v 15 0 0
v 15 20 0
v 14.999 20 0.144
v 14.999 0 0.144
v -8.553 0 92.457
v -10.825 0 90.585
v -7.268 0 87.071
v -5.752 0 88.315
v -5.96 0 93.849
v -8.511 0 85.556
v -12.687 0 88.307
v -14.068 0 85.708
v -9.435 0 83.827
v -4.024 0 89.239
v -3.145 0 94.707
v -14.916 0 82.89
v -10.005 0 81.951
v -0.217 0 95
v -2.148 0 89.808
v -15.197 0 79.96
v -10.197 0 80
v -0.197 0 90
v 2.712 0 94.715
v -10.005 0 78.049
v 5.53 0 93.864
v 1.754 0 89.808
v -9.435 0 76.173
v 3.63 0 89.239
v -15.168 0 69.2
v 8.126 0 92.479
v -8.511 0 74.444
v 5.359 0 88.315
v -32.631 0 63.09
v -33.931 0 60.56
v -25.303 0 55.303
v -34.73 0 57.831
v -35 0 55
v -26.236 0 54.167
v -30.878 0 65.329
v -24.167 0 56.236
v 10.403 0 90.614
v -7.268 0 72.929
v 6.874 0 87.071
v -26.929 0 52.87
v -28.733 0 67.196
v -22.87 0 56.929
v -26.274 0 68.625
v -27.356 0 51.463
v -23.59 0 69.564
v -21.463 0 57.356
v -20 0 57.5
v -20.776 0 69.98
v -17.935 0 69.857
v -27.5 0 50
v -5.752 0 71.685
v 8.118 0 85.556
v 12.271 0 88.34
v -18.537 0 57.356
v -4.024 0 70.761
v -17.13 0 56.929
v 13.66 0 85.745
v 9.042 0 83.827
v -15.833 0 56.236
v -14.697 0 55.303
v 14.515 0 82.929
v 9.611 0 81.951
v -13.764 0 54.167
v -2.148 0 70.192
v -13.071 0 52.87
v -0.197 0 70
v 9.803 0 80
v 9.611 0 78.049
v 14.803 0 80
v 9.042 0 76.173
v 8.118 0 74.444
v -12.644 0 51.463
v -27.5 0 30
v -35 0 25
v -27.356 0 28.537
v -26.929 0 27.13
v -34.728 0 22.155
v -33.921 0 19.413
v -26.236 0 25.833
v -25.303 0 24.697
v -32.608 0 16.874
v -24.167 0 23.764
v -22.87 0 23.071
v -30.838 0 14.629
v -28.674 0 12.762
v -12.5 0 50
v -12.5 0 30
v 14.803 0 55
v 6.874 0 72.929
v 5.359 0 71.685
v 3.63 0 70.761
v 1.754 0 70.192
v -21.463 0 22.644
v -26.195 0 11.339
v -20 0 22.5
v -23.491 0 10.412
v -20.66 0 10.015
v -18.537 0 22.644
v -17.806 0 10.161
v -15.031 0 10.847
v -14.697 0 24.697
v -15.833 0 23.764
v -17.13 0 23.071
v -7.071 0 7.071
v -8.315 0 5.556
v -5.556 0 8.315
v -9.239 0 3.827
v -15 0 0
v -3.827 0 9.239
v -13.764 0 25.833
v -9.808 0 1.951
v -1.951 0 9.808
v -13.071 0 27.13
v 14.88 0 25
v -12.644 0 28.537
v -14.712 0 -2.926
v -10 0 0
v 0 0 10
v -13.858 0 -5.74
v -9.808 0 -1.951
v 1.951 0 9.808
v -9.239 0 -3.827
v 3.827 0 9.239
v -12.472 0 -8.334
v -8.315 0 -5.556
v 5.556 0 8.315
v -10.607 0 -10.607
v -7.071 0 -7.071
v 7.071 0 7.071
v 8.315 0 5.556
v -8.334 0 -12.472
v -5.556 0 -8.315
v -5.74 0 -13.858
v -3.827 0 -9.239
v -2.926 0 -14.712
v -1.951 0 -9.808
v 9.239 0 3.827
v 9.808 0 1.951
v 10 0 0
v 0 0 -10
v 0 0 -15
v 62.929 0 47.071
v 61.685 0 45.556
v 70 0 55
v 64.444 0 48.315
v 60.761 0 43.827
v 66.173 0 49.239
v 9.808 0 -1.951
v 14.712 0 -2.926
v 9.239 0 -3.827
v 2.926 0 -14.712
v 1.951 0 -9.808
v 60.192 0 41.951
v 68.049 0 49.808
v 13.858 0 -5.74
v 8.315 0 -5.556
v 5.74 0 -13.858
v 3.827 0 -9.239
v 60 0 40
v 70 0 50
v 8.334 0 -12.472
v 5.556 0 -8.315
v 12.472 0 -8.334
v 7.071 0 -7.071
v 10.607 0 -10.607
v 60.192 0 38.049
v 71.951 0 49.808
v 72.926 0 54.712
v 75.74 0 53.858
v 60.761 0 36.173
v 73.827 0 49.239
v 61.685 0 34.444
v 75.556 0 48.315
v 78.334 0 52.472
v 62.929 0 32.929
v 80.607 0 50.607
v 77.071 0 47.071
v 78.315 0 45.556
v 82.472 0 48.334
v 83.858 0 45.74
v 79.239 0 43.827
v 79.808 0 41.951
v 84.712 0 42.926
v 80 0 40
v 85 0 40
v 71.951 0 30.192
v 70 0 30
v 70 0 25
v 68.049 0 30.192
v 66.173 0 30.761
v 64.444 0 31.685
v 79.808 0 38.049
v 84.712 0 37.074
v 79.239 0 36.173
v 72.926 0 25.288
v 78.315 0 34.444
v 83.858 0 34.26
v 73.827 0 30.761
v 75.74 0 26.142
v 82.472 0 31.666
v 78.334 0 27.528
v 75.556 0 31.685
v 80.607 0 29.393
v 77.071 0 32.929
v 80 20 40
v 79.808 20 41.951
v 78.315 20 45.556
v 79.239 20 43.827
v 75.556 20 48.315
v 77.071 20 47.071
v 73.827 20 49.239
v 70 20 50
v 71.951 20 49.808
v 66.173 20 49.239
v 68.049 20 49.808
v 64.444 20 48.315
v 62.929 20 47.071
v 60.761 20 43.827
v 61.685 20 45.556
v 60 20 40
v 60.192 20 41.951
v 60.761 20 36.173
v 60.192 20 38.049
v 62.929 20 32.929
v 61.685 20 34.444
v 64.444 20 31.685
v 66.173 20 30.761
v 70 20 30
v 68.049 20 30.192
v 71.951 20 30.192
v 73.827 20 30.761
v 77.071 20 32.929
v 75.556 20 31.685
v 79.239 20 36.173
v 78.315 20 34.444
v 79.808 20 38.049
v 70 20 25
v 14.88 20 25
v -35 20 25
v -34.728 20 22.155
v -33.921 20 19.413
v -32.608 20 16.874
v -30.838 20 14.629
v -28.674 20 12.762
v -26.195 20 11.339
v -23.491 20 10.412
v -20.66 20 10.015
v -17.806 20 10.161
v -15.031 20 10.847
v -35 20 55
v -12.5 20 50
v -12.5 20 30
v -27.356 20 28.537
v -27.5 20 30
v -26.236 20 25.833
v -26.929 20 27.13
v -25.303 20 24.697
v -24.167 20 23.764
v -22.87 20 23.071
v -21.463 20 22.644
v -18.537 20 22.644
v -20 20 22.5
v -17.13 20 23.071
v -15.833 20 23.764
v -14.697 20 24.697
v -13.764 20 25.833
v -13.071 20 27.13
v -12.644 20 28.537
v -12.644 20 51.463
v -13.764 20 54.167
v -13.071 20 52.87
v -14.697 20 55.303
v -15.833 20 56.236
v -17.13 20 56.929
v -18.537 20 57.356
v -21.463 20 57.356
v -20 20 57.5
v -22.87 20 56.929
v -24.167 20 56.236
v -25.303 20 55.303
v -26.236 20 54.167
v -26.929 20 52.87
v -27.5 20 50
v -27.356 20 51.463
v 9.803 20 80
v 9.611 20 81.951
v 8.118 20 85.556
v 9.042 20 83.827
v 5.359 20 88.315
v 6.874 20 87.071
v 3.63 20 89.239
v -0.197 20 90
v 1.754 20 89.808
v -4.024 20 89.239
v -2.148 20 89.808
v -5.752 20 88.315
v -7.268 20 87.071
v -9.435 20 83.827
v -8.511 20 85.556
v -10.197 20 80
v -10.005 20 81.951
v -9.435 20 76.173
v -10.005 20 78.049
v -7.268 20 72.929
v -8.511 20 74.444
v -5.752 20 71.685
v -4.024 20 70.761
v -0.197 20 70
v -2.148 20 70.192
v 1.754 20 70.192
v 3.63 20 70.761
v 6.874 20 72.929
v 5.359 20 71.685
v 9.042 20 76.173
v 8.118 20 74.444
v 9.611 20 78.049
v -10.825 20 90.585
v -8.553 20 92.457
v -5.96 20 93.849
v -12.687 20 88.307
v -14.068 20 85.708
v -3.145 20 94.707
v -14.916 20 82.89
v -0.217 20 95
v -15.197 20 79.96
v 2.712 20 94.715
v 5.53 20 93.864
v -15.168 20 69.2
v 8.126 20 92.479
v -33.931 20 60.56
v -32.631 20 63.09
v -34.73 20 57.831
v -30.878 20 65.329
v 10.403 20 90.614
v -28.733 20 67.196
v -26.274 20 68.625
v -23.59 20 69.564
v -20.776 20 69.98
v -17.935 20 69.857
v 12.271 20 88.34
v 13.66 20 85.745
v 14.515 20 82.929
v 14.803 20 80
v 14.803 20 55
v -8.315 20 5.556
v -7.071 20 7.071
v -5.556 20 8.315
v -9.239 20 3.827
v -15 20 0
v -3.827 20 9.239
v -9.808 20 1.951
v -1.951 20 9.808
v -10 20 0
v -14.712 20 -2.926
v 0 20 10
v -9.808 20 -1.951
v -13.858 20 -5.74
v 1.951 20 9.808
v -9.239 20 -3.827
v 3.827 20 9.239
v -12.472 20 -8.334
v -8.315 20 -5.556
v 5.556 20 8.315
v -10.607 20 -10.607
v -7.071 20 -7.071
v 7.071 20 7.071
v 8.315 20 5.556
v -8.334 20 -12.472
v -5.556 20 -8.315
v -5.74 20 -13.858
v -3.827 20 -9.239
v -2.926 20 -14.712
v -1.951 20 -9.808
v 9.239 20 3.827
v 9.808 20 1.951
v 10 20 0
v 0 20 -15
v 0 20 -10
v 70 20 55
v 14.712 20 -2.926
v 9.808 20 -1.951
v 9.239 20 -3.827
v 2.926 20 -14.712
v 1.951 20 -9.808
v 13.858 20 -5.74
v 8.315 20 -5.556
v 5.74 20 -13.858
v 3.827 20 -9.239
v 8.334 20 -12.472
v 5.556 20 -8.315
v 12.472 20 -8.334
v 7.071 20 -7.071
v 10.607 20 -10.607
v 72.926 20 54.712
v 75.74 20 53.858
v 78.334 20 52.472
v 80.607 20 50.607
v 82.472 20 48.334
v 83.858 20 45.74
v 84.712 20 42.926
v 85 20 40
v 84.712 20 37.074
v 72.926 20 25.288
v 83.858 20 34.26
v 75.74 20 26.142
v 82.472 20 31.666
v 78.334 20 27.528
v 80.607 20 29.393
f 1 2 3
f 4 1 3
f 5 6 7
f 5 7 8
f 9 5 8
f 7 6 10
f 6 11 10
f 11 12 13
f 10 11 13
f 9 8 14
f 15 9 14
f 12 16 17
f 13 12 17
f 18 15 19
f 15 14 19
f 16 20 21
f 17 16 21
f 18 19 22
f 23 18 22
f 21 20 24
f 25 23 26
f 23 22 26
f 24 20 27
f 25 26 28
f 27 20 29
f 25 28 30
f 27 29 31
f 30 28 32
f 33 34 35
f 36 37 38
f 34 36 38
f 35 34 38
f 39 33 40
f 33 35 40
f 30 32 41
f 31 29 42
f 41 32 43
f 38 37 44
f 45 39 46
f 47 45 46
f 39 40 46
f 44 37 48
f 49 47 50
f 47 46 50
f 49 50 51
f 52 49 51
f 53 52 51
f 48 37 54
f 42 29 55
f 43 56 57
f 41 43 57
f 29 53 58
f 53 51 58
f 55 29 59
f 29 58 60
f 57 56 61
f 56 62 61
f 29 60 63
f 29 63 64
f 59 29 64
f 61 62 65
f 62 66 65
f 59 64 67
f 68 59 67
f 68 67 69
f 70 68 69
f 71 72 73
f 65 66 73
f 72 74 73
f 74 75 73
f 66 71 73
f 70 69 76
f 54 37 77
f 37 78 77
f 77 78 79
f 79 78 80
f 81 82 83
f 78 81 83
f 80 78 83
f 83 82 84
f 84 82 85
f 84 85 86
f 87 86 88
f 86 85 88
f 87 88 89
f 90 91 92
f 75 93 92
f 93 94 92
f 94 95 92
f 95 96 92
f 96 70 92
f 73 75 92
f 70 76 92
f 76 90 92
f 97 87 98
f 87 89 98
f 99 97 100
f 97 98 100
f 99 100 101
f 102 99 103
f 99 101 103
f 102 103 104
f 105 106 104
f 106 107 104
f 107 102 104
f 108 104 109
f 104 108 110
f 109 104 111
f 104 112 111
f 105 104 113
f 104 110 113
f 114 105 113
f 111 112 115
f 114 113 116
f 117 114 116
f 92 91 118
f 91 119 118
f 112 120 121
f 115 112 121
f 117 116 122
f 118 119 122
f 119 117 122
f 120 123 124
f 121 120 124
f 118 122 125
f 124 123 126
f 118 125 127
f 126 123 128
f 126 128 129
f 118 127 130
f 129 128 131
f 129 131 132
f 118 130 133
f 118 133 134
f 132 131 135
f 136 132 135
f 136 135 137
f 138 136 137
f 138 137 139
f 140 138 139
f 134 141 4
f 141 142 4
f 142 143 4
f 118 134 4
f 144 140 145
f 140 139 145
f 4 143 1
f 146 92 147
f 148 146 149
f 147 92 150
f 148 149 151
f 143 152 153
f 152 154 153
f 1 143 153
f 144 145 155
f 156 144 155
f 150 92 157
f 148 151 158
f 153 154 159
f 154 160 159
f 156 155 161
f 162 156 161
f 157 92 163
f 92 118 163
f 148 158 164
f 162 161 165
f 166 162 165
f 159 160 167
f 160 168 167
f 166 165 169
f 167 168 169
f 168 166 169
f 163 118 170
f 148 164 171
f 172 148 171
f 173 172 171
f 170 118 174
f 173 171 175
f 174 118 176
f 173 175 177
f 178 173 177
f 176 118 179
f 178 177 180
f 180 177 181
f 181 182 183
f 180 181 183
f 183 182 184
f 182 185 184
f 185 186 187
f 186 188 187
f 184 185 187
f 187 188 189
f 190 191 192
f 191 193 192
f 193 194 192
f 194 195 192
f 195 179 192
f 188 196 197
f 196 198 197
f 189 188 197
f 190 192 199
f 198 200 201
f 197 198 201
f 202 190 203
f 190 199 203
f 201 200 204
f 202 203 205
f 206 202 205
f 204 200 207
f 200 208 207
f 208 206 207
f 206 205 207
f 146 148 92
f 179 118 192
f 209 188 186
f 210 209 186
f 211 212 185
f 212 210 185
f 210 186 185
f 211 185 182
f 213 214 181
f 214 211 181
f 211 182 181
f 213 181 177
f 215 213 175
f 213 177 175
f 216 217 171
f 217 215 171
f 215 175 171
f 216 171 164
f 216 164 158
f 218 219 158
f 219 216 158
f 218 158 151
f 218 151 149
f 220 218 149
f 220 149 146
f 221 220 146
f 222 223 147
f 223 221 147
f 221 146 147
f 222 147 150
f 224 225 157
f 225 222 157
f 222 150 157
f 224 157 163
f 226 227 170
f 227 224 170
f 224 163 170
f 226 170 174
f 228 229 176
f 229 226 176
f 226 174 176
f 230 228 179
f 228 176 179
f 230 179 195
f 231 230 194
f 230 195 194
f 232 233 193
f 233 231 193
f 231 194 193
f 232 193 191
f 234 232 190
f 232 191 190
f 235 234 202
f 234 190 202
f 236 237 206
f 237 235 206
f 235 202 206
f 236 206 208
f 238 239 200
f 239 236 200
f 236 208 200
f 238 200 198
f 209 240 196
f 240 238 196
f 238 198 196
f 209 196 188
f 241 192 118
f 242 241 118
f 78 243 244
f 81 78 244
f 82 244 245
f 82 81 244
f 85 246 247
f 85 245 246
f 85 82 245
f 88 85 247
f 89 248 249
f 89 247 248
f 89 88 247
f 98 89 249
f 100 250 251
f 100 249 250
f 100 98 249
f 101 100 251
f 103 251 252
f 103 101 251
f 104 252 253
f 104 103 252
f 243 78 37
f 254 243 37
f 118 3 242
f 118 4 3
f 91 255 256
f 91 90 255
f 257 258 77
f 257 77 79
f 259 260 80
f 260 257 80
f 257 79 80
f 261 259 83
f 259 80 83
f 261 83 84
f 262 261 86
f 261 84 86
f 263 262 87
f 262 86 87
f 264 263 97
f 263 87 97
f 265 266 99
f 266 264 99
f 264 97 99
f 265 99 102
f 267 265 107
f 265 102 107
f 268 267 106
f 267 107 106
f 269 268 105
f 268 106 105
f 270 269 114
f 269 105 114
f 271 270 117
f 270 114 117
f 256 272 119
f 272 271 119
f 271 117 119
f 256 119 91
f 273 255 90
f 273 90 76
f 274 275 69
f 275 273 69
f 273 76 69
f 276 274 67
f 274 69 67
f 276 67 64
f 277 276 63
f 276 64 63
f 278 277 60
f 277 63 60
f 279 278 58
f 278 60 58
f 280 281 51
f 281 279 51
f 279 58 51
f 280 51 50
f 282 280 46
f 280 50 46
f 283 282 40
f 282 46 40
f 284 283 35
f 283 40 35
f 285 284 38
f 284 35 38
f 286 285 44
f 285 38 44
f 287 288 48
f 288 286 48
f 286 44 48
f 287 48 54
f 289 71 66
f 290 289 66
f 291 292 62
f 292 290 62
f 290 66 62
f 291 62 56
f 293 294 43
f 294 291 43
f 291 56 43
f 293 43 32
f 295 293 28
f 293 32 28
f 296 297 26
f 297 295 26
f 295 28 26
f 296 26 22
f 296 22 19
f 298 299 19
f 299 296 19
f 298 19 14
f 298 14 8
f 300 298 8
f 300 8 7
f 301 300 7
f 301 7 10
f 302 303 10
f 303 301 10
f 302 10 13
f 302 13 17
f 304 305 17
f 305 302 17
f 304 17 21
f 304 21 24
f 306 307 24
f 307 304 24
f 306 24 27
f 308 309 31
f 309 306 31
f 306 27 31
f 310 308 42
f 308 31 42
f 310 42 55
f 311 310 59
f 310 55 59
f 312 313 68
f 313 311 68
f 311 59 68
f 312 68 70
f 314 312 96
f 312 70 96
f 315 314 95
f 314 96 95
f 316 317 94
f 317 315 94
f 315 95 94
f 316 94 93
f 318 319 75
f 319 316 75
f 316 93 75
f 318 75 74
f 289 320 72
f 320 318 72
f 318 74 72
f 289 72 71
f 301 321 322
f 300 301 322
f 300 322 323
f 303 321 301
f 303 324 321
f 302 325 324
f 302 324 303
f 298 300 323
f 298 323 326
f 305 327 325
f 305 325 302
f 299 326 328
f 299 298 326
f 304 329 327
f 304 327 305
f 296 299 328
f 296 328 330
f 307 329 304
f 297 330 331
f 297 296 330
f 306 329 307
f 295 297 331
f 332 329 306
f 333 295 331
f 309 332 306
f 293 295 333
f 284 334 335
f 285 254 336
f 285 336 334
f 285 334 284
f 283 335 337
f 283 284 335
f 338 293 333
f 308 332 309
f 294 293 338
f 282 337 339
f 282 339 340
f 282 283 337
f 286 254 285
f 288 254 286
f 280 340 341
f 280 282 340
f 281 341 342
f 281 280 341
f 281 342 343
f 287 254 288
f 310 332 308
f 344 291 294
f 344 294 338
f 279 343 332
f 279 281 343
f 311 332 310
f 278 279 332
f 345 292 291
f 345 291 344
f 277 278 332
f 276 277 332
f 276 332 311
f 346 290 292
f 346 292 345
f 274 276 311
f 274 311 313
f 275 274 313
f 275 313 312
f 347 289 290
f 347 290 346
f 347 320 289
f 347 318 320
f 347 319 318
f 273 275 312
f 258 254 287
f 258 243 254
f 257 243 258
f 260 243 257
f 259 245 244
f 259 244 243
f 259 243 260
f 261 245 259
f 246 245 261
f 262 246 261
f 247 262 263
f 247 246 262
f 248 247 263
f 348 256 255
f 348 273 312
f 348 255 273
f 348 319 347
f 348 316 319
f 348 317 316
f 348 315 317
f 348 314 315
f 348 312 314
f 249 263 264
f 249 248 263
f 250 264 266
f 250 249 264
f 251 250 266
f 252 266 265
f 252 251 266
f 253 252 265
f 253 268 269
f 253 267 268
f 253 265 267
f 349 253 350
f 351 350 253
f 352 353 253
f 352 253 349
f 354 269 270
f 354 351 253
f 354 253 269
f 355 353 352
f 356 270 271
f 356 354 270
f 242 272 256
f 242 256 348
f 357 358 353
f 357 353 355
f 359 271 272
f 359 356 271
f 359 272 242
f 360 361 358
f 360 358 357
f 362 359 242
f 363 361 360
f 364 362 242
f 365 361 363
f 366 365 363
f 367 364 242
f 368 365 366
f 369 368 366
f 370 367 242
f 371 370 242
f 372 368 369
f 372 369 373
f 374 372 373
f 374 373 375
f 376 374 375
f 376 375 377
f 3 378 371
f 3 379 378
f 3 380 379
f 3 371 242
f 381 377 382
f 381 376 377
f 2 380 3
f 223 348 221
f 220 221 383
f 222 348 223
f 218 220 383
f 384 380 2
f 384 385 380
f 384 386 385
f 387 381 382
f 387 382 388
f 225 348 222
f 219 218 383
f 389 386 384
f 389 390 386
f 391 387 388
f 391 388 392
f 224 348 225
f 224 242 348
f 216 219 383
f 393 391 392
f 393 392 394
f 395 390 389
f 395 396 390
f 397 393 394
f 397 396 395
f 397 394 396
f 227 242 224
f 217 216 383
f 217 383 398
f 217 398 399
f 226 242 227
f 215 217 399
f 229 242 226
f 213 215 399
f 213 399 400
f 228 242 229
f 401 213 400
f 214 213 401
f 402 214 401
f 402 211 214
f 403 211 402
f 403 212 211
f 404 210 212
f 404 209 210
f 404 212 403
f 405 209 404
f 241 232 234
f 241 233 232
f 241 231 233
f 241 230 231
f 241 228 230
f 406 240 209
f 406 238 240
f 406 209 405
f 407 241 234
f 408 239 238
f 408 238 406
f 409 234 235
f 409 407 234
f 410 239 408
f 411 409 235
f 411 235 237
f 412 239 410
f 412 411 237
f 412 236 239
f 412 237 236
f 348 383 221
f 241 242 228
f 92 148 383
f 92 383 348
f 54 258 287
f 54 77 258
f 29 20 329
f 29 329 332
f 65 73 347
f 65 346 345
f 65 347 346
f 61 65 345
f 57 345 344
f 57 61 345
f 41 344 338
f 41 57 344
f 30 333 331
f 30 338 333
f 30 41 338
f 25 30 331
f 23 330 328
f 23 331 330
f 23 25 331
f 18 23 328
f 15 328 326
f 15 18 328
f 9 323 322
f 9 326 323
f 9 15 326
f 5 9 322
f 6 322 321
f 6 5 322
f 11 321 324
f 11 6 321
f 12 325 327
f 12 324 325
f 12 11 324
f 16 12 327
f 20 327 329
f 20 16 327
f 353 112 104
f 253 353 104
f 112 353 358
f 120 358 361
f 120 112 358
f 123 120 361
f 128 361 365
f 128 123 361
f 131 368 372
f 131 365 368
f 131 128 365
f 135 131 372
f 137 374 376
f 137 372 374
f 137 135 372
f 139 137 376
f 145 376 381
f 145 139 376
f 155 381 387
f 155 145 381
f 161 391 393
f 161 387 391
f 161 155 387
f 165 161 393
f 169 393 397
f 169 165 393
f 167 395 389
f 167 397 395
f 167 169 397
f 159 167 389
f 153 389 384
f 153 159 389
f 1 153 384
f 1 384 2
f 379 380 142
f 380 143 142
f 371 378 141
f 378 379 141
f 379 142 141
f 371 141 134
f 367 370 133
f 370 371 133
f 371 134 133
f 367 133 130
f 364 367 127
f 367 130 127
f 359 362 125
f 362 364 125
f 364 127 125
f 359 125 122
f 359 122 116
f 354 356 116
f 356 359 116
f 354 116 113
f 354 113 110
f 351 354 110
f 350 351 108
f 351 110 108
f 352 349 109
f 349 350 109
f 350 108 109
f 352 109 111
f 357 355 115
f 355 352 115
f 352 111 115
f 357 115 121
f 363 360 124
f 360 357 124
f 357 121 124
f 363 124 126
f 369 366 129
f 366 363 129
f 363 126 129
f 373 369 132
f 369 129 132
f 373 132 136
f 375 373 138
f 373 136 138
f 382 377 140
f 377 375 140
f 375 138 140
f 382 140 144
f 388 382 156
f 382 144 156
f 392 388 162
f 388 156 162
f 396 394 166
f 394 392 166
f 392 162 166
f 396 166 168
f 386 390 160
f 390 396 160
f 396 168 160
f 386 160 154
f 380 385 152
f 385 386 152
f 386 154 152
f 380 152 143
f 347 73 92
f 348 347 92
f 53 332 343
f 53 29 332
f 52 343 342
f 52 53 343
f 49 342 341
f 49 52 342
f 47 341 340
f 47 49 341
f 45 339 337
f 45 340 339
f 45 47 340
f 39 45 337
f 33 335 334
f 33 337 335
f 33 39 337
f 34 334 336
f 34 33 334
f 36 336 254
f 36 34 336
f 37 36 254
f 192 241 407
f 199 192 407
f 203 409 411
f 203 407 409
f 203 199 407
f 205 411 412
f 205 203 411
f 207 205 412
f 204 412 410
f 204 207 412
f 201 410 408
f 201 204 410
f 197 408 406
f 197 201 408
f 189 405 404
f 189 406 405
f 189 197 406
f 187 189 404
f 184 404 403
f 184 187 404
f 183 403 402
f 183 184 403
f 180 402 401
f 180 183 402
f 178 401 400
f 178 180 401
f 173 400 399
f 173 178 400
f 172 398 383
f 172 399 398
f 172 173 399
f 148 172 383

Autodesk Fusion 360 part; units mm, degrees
sketch "Sketch1" plane through (0, 0, 0) normal (0, 1, 0) x (1, 0, 0)
  circle A0 centre (-0.1967, -80) radius 10
  circle A1 centre (-0.1967, -80) radius 5
  circle A2 centre (0, 0) radius 5
  circle A3 centre (0, 0) radius 10
  circle A4 centre (70, -40) radius 10
  circle A5 centre (70, -40) radius 5
  line L0 (-27.5, -30) -> (-27.5, -50)
  arc A6 (-27.5, -50) -> (-12.5, -50) centre (-20, -50) ccw
  line L1 (-12.5, -50) -> (-12.5, -30)
  arc A7 (-12.5, -30) -> (-27.5, -30) centre (-20, -30) ccw
  line L2 (-20, -30) -> (-20, -50) construction
  line L3 (-35, -25) -> (-35, -55)
  arc A8 (-35, -55) -> (-15.168, -69.2004) centre (-20, -55) ccw
  arc A9 (-15.0308, -10.847) -> (-35, -25) centre (-20, -25) ccw
  line L4 (-20, -25) -> (-20, -55) construction
  line L5 (70, -25) -> (14.8802, -25)
  line L6 (70, -55) -> (14.8033, -55)
  line L7 (-15, 0) -> (-15.0308, -10.847)
  line L8 (15, 0) -> (14.8802, -25)
  line L9 (14.8033, -80) -> (14.8033, -55)
  arc A10 (14.9993, -0.1437) -> (-15, 0) centre (0, 0) ccw
  line L10 (-15.1967, -79.96) -> (-15.168, -69.2004)
  arc A11 (-15.1967, -79.96) -> (14.8033, -80) centre (-0.1967, -80) ccw
  arc A12 (70, -55) -> (70, -25) centre (70, -40) ccw
  point P0 (-20, -40)
  point P1 (-20, -40)
  dimension "d1" = 30
  dimension "d2" = 20
  dimension "d3" = 10
  dimension "d4" = 10
  dimension "d5" = 20
  dimension "d6" = 30
  dimension "d7" = 30
  dimension "d8" = 20
  dimension "d9" = 10
  dimension "d10" = 15
  dimension "d11" = 20
  dimension "d12" = 80
  dimension "d13" = 70
  dimension "d14" = 40
  dimension "d15" = 20
  dimension "d16" = 30
  dimension "d17" = 30
  dimension "d18" = 30
extrude "Extrude1" add sketch "Sketch1" along normal blind 20 contours L3 A8 A9 L5 L6 L7 L8 L9 A10 L10 A11 A12
